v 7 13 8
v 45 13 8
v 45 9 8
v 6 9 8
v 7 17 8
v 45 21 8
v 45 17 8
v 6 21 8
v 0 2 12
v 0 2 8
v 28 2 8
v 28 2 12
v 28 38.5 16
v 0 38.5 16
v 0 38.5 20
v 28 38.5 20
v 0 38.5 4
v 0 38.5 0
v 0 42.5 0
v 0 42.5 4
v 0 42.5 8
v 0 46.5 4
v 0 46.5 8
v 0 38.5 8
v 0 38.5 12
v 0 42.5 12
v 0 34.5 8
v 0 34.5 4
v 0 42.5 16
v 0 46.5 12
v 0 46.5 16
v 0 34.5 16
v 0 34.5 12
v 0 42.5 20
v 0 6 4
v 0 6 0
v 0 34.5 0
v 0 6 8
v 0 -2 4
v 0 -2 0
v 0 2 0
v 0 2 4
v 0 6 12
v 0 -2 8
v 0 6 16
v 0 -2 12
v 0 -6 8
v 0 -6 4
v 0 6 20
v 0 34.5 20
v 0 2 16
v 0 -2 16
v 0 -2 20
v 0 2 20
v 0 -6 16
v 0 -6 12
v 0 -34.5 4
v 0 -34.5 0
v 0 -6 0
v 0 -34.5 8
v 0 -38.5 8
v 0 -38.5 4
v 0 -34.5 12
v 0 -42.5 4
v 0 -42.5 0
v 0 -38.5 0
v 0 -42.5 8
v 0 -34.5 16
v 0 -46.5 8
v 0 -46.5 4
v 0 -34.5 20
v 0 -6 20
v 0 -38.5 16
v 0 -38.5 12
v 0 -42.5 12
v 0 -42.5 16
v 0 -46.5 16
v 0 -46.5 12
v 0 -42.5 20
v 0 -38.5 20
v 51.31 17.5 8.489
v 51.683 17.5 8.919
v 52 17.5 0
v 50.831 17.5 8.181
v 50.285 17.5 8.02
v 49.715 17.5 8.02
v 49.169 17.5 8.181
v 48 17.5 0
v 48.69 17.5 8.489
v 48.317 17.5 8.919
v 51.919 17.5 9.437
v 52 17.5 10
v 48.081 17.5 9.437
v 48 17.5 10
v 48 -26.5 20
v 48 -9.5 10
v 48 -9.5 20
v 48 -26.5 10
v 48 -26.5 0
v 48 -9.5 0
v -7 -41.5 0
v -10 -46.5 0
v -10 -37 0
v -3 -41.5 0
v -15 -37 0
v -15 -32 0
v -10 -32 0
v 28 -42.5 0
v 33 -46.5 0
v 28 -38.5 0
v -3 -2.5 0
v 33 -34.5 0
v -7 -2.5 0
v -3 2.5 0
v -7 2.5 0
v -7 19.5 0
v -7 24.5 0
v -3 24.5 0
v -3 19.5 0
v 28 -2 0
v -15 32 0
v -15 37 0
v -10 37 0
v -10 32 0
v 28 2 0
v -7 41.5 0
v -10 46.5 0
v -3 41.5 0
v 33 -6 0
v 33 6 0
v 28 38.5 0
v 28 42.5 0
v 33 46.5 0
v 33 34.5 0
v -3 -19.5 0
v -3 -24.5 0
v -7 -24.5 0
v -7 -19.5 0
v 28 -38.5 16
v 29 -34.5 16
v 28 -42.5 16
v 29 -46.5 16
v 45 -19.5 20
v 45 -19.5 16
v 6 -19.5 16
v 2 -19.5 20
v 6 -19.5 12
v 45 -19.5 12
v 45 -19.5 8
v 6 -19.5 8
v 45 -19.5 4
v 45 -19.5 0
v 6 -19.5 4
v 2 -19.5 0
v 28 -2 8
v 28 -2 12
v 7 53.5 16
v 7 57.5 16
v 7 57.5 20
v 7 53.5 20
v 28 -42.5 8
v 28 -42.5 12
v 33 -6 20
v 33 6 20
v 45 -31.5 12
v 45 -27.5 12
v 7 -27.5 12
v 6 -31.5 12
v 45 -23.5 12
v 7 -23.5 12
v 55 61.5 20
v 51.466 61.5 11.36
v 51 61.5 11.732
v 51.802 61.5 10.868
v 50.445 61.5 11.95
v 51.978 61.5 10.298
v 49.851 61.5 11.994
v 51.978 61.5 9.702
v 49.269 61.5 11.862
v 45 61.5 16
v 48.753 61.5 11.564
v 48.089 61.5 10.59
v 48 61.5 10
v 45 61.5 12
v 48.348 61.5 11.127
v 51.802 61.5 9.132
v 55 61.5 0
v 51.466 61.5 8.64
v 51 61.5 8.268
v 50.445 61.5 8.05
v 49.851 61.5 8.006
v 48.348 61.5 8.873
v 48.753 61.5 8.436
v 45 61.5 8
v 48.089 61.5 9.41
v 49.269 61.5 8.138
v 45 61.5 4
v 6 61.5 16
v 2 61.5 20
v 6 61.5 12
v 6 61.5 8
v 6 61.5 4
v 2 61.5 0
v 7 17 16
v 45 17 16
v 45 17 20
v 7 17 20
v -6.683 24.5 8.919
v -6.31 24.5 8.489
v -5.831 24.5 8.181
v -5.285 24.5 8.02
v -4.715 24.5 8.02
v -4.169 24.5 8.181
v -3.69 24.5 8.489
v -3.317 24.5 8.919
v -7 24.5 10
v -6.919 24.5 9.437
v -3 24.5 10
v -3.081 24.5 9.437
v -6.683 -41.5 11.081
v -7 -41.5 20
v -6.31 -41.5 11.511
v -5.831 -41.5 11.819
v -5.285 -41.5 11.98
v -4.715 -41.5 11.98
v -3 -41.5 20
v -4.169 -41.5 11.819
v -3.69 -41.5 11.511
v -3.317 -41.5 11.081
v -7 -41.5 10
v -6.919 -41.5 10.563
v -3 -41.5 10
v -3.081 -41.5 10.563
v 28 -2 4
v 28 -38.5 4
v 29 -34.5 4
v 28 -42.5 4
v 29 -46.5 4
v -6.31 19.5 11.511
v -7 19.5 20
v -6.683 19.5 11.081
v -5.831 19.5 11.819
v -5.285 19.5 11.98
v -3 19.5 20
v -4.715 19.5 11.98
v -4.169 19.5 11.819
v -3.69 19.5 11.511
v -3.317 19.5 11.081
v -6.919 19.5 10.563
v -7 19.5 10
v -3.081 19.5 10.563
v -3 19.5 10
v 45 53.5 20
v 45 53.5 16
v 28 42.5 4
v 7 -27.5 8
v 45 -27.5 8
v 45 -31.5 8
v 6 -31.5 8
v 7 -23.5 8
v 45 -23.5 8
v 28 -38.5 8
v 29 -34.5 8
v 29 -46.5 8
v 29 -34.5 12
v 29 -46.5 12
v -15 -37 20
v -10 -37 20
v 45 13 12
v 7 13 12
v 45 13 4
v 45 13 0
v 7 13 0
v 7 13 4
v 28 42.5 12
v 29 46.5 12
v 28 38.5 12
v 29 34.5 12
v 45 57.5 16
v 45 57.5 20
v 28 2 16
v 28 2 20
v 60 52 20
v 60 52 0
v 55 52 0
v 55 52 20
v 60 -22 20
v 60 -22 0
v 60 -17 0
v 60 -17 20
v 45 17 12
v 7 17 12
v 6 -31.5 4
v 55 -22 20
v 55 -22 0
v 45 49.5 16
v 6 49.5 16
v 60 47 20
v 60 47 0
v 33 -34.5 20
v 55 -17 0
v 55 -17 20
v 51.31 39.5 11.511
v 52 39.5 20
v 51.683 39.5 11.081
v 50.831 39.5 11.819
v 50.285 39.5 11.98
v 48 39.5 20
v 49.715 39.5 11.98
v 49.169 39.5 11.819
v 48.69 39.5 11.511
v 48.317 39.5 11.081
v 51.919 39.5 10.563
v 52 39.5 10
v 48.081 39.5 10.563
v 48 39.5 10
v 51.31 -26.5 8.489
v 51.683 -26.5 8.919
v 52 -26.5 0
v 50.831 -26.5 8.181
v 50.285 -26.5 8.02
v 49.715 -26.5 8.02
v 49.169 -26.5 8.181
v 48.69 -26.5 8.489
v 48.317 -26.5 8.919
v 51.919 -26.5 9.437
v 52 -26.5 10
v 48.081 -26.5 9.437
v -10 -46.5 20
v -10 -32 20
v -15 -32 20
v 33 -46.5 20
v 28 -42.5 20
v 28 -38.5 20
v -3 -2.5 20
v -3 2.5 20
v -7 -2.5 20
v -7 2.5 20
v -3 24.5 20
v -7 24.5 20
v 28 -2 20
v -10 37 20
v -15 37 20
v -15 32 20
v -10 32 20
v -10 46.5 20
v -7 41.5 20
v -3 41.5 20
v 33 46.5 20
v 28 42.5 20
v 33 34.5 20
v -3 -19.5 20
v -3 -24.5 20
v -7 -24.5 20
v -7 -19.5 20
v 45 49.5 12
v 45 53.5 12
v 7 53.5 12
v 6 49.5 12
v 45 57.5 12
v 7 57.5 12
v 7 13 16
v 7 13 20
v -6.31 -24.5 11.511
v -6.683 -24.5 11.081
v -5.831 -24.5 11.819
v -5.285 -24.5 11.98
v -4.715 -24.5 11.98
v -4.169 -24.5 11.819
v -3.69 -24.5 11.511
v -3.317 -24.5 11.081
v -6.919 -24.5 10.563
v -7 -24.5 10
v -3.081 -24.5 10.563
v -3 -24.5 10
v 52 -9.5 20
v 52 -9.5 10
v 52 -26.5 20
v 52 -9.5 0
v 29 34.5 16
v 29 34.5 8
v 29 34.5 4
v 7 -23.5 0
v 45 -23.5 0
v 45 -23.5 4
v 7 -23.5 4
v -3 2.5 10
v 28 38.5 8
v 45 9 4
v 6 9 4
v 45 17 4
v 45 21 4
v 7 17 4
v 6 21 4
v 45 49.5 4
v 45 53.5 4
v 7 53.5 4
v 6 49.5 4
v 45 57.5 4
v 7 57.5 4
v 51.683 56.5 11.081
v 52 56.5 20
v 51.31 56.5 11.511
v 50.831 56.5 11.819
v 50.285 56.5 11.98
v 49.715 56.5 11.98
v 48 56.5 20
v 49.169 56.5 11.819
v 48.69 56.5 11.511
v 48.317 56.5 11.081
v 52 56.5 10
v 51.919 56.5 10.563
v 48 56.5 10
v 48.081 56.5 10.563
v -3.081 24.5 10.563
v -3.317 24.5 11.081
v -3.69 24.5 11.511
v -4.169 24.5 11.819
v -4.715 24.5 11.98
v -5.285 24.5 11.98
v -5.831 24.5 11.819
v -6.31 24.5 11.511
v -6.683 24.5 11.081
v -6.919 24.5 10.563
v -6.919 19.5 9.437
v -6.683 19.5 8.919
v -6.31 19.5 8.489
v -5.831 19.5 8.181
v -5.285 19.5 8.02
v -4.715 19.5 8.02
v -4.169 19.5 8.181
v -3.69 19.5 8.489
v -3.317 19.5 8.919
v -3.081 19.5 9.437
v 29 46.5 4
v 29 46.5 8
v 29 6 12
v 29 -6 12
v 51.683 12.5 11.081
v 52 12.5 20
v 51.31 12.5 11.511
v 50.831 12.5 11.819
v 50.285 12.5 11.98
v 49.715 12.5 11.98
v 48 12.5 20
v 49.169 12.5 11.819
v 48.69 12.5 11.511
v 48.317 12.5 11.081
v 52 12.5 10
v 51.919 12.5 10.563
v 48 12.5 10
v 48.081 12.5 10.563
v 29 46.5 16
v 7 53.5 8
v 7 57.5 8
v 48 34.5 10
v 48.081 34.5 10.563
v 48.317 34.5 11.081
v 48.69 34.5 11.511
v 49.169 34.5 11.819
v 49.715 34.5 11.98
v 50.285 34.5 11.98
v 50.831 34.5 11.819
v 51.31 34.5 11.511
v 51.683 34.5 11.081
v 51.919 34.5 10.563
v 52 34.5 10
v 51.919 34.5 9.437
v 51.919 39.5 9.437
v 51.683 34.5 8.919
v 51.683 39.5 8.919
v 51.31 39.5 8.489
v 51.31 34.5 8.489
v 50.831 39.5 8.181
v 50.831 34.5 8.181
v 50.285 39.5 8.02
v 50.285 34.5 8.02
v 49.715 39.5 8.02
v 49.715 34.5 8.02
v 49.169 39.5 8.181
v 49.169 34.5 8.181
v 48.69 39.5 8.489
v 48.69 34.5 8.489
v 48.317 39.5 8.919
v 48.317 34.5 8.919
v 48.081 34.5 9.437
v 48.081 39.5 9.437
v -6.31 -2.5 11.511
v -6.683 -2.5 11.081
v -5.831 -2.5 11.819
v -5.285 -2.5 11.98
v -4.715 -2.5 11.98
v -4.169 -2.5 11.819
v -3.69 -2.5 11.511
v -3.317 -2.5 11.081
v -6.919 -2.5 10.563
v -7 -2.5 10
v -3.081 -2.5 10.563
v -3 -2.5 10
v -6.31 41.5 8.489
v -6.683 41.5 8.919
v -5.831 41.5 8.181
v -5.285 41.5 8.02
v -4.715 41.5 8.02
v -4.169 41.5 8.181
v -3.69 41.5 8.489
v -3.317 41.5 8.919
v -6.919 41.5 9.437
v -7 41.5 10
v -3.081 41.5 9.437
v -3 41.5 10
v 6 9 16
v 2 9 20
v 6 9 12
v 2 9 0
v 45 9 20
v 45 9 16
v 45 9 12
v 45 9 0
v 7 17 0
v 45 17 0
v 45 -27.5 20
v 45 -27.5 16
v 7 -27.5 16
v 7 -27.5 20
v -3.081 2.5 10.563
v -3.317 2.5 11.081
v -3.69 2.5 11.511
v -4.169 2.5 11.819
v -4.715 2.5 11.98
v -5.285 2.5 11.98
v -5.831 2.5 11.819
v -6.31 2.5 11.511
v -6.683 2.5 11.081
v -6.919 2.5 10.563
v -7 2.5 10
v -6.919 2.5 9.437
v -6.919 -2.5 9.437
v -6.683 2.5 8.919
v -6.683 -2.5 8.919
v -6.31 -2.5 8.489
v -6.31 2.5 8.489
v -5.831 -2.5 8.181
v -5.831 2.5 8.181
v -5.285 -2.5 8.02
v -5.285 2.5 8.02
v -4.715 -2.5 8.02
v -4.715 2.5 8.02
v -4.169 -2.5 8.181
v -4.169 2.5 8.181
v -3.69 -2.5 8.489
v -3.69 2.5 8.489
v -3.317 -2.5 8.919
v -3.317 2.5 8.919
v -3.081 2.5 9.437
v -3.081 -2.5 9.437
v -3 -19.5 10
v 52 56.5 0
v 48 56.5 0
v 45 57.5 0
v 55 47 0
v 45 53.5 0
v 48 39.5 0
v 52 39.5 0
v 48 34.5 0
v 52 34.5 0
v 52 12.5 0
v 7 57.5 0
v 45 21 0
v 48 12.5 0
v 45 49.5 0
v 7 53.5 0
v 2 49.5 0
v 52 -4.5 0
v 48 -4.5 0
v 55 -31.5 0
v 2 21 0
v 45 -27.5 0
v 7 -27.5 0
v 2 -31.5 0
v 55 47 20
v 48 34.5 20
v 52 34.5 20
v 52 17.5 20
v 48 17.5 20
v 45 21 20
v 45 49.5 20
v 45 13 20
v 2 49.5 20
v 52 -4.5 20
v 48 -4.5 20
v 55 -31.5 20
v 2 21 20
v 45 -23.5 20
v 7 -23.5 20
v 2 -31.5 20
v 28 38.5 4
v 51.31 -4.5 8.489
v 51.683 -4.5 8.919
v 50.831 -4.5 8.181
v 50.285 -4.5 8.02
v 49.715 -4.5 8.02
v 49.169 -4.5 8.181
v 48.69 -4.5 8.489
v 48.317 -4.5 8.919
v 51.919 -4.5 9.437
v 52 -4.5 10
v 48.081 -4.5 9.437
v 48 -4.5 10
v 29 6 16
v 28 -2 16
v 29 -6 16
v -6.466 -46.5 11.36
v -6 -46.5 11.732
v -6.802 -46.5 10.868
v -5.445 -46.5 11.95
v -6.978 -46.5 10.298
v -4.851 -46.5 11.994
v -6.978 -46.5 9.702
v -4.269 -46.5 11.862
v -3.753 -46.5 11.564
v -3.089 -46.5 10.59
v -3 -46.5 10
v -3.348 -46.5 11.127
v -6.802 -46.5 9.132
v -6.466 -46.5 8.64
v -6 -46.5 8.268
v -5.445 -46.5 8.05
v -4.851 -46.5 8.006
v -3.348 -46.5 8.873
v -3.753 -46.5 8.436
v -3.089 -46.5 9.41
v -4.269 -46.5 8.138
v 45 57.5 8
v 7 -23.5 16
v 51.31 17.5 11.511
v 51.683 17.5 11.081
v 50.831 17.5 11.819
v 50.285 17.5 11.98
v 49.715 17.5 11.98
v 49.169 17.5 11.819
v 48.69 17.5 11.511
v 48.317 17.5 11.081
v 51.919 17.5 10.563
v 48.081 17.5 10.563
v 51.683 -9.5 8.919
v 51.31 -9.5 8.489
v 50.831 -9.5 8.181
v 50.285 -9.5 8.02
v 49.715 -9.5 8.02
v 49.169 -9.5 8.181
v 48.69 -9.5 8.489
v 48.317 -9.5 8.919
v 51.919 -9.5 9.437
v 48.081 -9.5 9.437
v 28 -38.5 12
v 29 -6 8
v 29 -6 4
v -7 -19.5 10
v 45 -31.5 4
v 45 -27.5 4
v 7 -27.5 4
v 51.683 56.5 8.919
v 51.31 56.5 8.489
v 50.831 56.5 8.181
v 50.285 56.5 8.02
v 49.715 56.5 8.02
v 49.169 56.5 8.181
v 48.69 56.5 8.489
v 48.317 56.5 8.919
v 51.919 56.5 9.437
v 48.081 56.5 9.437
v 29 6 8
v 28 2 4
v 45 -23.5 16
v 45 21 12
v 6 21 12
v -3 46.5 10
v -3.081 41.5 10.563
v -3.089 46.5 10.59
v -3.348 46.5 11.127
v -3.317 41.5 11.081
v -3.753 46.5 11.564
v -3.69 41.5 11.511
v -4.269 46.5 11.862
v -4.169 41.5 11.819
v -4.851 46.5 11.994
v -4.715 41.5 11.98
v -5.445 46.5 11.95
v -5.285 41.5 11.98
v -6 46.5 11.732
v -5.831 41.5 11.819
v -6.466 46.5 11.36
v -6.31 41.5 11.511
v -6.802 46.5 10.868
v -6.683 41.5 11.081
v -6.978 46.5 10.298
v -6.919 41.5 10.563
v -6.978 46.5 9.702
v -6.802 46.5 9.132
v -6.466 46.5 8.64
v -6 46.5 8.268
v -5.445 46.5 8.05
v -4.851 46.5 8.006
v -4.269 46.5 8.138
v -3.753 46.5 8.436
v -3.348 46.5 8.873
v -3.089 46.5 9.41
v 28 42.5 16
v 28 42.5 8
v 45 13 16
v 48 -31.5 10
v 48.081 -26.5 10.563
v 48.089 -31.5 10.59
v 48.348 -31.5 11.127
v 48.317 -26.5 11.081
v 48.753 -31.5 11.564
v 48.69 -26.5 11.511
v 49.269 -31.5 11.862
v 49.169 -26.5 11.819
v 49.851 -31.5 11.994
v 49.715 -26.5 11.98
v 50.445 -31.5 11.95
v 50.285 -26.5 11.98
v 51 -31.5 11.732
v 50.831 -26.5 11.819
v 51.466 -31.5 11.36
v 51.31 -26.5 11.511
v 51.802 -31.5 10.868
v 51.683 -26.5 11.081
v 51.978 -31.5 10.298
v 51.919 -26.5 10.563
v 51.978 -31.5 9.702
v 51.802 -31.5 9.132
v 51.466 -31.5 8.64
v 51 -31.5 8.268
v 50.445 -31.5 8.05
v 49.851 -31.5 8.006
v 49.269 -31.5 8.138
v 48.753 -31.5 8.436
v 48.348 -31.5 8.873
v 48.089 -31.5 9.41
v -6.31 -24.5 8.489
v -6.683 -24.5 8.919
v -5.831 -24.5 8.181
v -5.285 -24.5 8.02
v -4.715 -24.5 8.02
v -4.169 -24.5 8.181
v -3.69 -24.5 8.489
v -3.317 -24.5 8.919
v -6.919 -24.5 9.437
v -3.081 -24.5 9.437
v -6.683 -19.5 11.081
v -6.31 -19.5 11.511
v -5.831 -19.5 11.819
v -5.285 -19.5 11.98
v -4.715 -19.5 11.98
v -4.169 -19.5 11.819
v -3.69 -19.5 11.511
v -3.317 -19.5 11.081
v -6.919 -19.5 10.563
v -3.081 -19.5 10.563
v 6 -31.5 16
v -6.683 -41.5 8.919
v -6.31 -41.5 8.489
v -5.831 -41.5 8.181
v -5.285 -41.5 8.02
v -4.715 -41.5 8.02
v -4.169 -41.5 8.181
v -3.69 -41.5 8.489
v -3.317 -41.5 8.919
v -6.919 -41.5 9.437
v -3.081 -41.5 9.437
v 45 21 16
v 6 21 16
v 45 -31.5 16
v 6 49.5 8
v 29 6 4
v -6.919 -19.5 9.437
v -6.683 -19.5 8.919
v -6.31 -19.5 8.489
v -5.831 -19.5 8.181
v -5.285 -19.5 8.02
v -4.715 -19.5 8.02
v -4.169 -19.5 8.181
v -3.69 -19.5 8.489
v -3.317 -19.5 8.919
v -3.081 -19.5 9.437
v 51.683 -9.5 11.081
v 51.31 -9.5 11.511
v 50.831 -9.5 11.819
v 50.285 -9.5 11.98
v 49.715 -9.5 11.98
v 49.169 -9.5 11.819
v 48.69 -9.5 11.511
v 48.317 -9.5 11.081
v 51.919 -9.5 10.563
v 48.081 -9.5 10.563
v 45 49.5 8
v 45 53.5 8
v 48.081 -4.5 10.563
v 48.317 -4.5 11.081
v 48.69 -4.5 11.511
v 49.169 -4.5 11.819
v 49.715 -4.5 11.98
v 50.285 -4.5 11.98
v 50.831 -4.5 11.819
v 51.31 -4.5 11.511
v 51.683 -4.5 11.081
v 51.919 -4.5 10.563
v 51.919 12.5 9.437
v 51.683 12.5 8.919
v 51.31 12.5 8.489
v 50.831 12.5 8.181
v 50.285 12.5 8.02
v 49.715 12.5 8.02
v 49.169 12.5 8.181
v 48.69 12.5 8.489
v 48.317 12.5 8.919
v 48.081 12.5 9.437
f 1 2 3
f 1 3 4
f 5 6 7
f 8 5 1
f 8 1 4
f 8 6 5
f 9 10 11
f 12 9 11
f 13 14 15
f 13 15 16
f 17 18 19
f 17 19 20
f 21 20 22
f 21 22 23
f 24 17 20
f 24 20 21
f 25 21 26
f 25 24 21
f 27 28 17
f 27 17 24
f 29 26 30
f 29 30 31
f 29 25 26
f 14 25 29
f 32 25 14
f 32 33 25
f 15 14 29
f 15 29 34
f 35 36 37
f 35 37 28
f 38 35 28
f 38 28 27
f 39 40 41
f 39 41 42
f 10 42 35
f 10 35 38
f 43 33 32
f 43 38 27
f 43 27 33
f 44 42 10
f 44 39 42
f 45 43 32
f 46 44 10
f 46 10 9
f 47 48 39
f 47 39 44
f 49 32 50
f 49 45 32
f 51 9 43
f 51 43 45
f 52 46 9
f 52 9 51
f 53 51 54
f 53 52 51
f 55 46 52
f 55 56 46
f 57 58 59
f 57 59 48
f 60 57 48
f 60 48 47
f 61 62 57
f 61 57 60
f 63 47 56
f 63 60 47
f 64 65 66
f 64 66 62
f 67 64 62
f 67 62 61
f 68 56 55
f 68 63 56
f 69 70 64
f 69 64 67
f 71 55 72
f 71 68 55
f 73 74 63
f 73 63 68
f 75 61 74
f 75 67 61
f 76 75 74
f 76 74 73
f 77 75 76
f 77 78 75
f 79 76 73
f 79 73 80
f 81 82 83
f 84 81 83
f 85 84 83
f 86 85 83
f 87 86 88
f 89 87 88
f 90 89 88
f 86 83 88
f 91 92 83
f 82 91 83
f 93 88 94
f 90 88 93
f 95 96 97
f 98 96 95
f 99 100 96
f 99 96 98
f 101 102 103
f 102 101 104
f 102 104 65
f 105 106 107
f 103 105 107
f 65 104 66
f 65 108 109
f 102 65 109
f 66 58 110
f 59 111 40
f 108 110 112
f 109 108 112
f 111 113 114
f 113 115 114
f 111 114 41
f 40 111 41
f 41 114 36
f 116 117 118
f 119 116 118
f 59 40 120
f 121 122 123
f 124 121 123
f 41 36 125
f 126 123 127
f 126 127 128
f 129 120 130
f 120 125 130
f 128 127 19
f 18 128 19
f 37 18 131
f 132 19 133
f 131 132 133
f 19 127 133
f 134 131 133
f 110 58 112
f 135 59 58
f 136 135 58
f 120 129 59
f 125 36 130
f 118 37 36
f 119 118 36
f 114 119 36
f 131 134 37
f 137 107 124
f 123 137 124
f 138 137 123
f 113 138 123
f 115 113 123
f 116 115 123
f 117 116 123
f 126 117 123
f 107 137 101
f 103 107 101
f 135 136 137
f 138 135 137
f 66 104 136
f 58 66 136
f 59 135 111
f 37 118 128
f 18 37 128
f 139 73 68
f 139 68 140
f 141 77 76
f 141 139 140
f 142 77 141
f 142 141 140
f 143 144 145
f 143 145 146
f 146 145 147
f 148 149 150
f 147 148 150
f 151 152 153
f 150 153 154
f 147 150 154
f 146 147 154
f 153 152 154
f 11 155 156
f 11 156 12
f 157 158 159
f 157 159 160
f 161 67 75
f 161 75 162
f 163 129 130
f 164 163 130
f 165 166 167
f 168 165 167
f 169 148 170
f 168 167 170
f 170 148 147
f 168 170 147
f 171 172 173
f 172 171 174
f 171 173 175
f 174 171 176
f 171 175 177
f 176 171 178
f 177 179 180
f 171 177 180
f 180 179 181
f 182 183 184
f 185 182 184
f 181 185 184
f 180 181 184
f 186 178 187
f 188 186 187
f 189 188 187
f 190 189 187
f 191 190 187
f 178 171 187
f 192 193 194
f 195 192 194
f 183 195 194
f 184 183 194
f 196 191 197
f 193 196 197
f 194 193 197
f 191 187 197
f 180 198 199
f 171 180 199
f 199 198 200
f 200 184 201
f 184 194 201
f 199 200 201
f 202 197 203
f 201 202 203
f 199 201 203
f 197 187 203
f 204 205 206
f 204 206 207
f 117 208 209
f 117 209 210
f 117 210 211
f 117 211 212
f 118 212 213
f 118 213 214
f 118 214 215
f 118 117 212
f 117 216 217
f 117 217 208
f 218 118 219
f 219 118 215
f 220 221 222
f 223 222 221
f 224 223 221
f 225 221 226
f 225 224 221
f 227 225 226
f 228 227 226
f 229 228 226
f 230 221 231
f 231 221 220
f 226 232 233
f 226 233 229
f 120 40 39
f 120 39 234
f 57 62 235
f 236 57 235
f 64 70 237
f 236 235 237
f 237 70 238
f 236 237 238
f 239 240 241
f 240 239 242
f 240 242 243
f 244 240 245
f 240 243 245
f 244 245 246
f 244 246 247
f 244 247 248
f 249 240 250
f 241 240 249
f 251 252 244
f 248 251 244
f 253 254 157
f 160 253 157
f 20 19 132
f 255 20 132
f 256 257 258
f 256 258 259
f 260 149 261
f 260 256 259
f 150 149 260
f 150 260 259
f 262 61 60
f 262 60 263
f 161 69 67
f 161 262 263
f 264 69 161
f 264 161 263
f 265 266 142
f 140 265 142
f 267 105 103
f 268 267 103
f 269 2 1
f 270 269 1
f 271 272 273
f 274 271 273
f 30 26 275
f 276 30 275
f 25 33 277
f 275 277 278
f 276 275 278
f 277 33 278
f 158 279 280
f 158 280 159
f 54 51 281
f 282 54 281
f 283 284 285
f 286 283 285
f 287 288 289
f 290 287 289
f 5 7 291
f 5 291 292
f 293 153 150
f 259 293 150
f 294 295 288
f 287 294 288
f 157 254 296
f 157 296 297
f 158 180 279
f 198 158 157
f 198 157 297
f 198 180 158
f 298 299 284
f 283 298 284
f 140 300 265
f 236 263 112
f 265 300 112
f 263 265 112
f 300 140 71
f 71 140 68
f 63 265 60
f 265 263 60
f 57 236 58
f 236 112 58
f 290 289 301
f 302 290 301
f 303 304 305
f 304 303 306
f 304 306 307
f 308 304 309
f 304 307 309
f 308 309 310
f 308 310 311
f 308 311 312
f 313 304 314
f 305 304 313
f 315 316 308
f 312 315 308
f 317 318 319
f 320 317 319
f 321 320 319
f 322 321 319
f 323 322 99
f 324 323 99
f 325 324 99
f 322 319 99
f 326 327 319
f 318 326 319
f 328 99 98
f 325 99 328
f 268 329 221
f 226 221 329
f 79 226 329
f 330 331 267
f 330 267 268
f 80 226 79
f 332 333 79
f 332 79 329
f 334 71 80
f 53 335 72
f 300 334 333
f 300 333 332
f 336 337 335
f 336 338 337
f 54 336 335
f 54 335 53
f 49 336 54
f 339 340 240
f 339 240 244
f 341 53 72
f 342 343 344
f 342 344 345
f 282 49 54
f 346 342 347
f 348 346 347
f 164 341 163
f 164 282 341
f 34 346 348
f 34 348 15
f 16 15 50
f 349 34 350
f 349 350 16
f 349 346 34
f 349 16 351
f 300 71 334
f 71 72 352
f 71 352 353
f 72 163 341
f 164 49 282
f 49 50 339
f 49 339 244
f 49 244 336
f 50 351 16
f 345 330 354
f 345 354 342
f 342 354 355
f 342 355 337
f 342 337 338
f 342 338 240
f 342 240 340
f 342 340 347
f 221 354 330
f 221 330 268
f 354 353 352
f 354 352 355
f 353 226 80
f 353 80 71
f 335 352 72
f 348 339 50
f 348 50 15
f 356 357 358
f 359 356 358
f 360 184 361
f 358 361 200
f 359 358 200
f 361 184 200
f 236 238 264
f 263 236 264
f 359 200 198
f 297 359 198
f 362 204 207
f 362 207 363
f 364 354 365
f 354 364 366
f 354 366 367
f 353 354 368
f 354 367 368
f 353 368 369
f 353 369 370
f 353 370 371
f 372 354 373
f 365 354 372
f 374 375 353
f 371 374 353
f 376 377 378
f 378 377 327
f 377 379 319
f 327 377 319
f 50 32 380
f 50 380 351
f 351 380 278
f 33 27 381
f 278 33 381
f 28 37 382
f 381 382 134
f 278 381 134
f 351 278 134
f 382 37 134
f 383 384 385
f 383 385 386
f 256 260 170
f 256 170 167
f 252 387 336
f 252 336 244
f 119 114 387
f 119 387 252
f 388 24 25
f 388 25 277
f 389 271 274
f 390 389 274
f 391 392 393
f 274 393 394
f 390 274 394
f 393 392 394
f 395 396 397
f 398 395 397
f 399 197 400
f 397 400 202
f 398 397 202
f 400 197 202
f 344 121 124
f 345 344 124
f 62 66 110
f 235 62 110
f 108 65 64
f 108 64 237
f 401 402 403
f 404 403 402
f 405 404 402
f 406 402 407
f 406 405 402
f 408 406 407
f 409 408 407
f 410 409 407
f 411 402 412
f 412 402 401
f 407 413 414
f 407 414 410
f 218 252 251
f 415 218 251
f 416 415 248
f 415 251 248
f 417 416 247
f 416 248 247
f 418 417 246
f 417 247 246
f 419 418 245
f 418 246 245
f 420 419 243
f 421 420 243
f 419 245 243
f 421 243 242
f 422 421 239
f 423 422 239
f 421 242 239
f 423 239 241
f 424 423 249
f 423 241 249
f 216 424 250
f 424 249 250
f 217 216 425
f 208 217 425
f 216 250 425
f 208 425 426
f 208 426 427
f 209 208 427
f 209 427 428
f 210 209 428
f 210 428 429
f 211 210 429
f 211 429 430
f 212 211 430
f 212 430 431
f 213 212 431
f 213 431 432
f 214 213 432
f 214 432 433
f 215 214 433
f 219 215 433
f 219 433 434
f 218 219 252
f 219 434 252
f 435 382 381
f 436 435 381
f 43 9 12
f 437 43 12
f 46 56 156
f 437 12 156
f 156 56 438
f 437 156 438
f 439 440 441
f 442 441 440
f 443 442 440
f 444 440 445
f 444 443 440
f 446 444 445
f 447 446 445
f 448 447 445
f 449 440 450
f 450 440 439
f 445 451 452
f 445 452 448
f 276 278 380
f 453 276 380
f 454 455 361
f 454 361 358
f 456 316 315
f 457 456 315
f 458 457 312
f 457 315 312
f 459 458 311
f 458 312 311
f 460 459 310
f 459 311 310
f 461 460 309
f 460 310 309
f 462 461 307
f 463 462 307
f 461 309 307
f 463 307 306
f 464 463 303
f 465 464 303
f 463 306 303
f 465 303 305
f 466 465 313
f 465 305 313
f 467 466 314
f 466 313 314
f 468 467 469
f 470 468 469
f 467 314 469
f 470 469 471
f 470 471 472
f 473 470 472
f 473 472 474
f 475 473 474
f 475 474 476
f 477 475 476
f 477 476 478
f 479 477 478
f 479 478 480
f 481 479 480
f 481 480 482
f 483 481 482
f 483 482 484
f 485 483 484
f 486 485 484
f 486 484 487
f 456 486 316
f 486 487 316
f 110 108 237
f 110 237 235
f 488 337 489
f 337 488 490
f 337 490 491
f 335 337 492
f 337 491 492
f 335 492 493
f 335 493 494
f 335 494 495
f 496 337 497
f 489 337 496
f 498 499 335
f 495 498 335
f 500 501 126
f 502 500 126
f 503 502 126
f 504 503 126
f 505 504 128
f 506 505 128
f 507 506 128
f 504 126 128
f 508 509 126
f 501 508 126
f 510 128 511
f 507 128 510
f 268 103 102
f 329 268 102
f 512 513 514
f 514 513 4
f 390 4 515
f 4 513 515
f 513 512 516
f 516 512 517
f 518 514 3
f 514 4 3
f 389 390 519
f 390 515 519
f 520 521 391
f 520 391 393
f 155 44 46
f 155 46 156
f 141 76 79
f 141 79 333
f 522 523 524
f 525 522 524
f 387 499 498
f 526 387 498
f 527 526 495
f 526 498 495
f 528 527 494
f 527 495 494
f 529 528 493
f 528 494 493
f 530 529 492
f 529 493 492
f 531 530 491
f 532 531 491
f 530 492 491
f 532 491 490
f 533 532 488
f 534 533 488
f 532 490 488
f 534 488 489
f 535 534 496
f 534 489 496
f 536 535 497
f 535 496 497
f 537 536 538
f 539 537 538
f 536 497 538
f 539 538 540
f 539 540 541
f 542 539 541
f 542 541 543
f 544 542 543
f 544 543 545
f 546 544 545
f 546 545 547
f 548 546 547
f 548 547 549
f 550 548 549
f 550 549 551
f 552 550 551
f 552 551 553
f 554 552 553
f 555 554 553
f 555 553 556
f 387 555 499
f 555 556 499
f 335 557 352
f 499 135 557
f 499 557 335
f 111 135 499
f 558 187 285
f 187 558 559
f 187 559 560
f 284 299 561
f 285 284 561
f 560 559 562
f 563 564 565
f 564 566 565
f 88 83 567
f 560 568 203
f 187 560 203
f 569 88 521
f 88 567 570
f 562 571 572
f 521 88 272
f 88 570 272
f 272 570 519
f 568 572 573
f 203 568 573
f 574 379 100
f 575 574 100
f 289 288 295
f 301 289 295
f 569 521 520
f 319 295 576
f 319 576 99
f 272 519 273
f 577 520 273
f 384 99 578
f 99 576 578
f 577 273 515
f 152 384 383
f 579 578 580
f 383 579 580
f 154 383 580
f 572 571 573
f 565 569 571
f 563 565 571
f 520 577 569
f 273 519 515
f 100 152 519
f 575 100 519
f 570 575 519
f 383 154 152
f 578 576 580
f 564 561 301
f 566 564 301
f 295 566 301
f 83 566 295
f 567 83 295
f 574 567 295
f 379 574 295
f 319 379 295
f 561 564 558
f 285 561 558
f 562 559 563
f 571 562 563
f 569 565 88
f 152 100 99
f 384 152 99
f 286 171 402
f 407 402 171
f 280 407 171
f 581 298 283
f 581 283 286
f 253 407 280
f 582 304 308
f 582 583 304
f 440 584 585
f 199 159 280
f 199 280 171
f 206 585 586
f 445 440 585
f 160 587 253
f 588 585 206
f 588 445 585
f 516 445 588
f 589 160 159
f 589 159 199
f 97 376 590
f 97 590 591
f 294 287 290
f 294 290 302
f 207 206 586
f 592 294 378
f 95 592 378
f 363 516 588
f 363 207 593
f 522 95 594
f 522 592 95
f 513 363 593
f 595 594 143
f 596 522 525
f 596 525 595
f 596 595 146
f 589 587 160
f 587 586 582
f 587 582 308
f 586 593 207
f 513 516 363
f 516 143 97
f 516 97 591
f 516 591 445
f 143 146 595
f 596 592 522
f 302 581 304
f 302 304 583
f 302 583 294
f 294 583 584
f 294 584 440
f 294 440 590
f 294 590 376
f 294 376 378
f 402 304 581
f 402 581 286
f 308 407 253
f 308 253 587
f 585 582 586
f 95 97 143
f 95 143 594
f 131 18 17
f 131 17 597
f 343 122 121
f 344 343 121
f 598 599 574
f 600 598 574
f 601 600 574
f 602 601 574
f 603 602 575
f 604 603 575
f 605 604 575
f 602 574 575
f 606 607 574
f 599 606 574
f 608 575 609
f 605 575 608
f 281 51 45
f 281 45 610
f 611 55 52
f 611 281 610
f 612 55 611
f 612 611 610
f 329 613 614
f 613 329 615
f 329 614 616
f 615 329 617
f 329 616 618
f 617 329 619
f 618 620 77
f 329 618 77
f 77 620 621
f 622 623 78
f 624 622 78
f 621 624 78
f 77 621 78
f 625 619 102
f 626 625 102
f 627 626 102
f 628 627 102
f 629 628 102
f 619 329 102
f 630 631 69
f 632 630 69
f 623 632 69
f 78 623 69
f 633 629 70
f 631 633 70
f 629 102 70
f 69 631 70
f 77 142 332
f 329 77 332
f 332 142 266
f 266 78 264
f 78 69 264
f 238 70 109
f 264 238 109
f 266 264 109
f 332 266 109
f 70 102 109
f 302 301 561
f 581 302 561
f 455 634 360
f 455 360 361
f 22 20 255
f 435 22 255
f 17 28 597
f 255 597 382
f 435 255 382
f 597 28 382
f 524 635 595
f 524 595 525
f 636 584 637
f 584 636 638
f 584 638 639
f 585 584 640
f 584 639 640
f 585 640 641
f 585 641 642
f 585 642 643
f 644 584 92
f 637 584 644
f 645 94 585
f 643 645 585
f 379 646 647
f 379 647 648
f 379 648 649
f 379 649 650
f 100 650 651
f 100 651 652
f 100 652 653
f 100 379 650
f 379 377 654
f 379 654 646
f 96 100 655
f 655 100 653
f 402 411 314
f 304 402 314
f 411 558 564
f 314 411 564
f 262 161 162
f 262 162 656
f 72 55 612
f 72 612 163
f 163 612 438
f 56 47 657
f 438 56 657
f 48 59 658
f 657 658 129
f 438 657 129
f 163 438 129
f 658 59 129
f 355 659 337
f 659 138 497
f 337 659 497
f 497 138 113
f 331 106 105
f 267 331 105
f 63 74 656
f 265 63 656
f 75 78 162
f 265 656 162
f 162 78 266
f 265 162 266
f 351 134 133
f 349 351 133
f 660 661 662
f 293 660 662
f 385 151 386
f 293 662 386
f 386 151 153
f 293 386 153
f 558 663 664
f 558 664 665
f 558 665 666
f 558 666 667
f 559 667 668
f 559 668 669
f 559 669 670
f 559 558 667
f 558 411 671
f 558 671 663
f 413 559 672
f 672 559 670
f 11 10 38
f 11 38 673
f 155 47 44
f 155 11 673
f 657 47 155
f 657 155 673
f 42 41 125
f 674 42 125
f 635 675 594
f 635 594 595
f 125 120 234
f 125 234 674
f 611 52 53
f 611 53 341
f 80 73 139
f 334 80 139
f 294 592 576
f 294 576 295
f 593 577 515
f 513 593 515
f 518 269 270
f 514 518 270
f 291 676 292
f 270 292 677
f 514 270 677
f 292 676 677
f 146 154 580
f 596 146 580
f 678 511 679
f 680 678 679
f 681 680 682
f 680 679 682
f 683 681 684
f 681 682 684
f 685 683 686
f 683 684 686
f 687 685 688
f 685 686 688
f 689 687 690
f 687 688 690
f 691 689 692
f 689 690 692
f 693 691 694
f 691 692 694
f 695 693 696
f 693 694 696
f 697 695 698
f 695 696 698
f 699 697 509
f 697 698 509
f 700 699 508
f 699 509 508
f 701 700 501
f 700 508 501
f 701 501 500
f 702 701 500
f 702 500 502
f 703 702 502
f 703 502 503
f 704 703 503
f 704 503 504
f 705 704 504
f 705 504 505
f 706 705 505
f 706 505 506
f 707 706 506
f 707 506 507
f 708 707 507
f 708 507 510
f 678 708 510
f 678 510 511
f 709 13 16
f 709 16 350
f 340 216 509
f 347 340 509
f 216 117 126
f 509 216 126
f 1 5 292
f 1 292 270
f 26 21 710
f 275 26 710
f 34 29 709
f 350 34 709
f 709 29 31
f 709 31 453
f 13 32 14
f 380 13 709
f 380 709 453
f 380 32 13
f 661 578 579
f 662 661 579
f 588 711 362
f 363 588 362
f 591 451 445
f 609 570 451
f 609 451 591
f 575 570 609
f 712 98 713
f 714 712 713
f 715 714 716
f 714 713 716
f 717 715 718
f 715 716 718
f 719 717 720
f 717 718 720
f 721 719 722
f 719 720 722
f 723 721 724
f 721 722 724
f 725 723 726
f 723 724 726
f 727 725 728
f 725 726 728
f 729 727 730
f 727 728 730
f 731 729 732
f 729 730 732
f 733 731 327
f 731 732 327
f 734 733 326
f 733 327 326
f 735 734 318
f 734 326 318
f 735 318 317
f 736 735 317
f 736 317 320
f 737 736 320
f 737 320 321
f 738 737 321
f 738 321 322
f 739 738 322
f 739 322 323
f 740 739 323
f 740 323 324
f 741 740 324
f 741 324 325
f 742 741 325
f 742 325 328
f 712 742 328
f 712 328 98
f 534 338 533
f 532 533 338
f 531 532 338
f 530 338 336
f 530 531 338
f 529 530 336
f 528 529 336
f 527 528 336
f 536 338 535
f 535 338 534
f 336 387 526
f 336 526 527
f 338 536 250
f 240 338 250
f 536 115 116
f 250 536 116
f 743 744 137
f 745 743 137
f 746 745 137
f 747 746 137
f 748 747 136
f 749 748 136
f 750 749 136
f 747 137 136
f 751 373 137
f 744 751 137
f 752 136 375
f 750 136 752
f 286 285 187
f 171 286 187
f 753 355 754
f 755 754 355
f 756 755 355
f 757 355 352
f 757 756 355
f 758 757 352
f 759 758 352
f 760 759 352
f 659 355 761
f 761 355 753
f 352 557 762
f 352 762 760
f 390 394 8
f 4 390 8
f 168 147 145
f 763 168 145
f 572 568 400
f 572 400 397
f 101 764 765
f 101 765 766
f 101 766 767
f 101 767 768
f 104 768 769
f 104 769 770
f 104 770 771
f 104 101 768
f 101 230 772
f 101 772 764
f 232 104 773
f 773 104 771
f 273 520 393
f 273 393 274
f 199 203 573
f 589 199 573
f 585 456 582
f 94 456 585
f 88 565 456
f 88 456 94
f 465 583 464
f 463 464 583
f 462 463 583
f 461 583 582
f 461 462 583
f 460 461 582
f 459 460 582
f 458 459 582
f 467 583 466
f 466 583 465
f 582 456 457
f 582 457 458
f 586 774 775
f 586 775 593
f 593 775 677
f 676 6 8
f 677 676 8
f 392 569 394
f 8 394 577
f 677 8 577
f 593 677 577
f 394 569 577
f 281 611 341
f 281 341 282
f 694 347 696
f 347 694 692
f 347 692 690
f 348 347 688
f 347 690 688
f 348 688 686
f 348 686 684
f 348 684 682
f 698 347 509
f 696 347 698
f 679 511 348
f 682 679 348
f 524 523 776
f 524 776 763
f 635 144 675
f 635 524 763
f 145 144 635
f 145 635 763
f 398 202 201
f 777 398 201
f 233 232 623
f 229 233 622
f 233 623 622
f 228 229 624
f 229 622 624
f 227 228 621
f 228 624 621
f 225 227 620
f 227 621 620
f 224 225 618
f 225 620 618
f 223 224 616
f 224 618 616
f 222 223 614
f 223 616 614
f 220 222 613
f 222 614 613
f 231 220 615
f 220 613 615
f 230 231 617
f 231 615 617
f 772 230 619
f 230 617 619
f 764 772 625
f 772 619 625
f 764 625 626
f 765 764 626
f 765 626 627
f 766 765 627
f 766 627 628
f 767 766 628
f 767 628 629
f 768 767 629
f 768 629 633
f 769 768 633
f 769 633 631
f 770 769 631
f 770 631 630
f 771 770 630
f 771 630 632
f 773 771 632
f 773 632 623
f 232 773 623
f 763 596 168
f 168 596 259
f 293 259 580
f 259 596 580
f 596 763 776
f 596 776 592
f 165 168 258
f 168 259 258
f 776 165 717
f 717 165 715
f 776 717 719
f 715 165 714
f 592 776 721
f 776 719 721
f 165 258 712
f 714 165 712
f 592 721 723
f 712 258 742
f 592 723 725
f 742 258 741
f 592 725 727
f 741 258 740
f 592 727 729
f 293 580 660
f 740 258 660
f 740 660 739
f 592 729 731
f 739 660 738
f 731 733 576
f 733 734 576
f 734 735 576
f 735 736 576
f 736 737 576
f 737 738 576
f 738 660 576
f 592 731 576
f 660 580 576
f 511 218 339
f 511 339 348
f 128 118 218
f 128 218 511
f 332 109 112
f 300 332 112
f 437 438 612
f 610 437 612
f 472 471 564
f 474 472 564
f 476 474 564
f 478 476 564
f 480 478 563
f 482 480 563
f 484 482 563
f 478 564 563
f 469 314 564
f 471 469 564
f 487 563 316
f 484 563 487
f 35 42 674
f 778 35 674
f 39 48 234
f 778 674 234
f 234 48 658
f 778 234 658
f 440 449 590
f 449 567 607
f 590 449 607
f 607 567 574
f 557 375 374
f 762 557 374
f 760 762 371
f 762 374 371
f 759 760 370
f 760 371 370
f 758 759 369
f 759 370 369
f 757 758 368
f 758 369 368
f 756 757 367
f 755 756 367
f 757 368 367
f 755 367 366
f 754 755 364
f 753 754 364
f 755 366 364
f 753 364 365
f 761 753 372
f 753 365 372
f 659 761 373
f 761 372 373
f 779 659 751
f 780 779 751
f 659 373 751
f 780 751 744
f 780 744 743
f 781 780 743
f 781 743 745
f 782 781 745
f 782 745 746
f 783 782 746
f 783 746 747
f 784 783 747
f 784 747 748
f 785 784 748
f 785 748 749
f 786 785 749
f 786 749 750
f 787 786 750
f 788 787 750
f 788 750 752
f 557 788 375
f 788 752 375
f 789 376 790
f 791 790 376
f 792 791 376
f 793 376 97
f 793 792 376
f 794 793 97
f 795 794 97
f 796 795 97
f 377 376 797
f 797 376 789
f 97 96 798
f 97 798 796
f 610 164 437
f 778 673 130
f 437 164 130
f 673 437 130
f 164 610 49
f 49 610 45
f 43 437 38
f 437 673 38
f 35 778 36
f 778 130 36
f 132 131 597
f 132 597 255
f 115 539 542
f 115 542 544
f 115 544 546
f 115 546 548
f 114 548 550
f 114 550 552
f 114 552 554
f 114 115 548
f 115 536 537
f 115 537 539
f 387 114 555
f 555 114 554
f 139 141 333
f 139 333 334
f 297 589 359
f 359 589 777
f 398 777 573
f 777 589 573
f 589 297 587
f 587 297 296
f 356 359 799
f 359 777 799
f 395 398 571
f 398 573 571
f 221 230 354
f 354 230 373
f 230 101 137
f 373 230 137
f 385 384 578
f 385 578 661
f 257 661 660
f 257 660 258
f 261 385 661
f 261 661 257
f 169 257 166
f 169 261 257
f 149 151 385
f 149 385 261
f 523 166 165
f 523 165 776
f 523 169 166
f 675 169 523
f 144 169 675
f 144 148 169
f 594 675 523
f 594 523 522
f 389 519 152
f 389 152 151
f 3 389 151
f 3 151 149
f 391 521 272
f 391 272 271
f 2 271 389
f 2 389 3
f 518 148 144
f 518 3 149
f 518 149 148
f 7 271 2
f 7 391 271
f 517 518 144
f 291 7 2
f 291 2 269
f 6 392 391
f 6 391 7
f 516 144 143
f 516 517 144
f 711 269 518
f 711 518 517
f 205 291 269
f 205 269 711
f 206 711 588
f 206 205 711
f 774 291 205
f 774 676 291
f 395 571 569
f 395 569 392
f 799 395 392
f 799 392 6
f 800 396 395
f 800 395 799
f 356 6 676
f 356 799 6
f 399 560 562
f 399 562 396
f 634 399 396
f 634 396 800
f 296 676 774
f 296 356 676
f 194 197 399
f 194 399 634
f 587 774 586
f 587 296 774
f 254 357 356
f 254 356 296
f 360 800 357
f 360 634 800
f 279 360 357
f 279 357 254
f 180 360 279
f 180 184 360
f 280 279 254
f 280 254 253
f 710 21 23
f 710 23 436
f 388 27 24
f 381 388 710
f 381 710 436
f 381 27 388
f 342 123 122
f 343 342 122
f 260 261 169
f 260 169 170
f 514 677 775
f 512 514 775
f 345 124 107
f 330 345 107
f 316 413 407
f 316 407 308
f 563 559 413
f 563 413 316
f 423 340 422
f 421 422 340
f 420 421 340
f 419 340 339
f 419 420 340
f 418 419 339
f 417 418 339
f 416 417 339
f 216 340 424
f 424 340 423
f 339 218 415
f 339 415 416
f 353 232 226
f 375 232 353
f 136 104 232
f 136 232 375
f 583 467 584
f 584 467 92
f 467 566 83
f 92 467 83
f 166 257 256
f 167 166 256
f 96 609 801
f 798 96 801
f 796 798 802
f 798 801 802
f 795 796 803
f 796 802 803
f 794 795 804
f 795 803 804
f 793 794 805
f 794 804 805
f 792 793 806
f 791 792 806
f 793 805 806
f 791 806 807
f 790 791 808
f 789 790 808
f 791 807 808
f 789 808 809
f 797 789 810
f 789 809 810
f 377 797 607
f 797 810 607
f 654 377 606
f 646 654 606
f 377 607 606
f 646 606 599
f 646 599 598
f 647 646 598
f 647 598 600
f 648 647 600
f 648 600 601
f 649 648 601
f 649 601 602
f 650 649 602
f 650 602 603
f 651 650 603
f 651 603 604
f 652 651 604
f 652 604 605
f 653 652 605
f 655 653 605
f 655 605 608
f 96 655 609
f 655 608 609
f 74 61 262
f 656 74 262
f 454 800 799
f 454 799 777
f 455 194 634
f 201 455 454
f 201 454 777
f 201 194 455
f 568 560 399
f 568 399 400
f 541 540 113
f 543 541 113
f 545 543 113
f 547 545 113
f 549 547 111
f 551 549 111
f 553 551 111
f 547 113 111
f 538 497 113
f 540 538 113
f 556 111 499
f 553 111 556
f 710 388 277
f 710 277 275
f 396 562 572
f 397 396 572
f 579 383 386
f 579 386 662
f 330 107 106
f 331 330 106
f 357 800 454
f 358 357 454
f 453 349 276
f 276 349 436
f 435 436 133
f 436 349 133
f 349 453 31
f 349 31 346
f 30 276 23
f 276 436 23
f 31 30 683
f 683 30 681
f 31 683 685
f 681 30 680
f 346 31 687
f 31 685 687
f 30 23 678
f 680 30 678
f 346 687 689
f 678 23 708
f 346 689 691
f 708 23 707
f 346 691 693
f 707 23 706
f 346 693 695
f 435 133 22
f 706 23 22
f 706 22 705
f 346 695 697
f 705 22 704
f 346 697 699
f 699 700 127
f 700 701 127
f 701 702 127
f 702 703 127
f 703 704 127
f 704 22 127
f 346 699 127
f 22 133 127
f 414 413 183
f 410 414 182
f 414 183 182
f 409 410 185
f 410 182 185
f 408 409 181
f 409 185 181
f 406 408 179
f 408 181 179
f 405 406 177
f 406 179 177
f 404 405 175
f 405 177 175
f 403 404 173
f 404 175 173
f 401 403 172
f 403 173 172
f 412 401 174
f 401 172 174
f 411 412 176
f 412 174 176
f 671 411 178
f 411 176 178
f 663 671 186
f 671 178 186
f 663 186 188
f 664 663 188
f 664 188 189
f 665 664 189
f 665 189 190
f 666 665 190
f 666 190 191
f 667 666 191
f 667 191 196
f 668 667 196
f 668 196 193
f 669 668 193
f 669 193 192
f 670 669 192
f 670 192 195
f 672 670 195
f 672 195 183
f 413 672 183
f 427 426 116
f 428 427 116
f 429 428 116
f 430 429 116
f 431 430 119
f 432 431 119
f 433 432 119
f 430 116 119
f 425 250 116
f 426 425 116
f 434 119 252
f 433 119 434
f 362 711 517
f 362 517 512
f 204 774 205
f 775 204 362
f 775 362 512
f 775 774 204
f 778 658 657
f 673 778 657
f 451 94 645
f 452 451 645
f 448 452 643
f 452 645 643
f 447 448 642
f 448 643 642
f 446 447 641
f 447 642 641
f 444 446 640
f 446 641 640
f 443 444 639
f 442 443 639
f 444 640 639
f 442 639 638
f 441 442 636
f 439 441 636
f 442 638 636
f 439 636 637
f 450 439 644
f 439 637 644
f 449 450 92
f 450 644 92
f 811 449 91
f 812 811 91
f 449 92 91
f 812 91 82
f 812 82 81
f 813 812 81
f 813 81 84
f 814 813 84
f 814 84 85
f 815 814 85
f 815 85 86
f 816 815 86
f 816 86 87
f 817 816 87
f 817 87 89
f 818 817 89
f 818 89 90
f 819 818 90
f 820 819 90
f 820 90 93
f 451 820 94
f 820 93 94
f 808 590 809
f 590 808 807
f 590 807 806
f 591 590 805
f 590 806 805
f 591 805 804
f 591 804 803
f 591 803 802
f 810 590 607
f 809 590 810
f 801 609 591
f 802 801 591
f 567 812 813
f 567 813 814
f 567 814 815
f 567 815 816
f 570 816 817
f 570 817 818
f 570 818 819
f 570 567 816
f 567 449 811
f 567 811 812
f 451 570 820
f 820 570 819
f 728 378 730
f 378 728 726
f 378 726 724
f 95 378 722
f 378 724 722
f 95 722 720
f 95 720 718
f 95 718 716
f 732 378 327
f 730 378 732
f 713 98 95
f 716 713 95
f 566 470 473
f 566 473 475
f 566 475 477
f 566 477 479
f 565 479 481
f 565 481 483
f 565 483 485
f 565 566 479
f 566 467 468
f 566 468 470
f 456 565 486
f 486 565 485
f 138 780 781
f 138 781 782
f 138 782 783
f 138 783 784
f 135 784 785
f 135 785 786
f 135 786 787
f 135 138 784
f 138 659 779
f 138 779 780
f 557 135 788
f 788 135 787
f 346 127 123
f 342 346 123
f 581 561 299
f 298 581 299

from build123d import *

# Parameters (mm, degrees)
SKETCH_W        = 4
SKETCH_H        = 17
SKETCH_W_2      = 28
SKETCH_H_2      = 4
PAD_DEPTH       = 20
SKETCH001_R     = 2
SKETCH001_W     = 29
SKETCH001_H     = 4
POCKET_DEPTH    = 93.001
SKETCH002_W     = 4
SKETCH002_H     = 17
SKETCH002_W_2   = 38
SKETCH002_H_2   = 4
PAD001_DEPTH    = 20
SKETCH003_R     = 2
SKETCH003_W     = 39
SKETCH003_H     = 4
POCKET001_DEPTH = 93.001


with BuildPart() as soporte_aligerado:
    # Sketch → Pad (new body)
    with BuildSketch(Plane.XY):
        Polygon((-10, -46.5), (33, -46.5), (33, -34.5), (0, -34.5), (0, -6), (33, -6), (33, 6), (0, 6), (0, 34.5), (33, 34.5), (33, 46.5), (-10, 46.5), (-10, 37), (-15, 37), (-15, 32), (-10, 32), (-10, -32), (-15, -32), (-15, -37), (-10, -37), align=None)
        with Locations((-5, 33)):
            Rectangle(SKETCH_W, SKETCH_H, mode=Mode.SUBTRACT)
        with Locations((-5, -33)):
            Rectangle(SKETCH_W, SKETCH_H, mode=Mode.SUBTRACT)
        with Locations((-5, -11)):
            Rectangle(SKETCH_W, SKETCH_H, mode=Mode.SUBTRACT)
        with Locations((-5, 11)):
            Rectangle(SKETCH_W, SKETCH_H, mode=Mode.SUBTRACT)
        with Locations((14, -40.5)):
            Rectangle(SKETCH_W_2, SKETCH_H_2, mode=Mode.SUBTRACT)
        with Locations((14, 0)):
            Rectangle(SKETCH_W_2, SKETCH_H_2, mode=Mode.SUBTRACT)
        with Locations((14, 40.5)):
            Rectangle(SKETCH_W_2, SKETCH_H_2, mode=Mode.SUBTRACT)
    extrude(amount=PAD_DEPTH)

    # Sketch001 → Pocket (cut, through all)
    with BuildSketch(Plane.XZ.offset(46.5)):
        with Locations((-5, 10)):
            Circle(SKETCH001_R)
        with Locations((14.5, 14)):
            Rectangle(SKETCH001_W, SKETCH001_H)
        with Locations((14.5, 6)):
            Rectangle(SKETCH001_W, SKETCH001_H)
    extrude(amount=-POCKET_DEPTH, mode=Mode.SUBTRACT)


with BuildPart() as soporte_aligerado001:
    # Sketch002 → Pad001 (new body)
    with BuildSketch(Plane(origin=(45, 15, 0), x_dir=(-1, 0, 0), z_dir=(0, 0, 1))):
        Polygon((-10, -46.5), (43, -46.5), (43, -34.5), (0, -34.5), (0, -6), (43, -6), (43, 6), (0, 6), (0, 34.5), (43, 34.5), (43, 46.5), (-10, 46.5), (-10, 37), (-15, 37), (-15, 32), (-10, 32), (-10, -32), (-15, -32), (-15, -37), (-10, -37), align=None)
        with Locations((-5, 33)):
            Rectangle(SKETCH002_W, SKETCH002_H, mode=Mode.SUBTRACT)
        with Locations((-5, -33)):
            Rectangle(SKETCH002_W, SKETCH002_H, mode=Mode.SUBTRACT)
        with Locations((-5, -11)):
            Rectangle(SKETCH002_W, SKETCH002_H, mode=Mode.SUBTRACT)
        with Locations((-5, 11)):
            Rectangle(SKETCH002_W, SKETCH002_H, mode=Mode.SUBTRACT)
        with Locations((19, -40.5)):
            Rectangle(SKETCH002_W_2, SKETCH002_H_2, mode=Mode.SUBTRACT)
        with Locations((19, 0)):
            Rectangle(SKETCH002_W_2, SKETCH002_H_2, mode=Mode.SUBTRACT)
        with Locations((19, 40.5)):
            Rectangle(SKETCH002_W_2, SKETCH002_H_2, mode=Mode.SUBTRACT)
    extrude(amount=PAD001_DEPTH)

    # Sketch003 → Pocket001 (cut, through all)
    with BuildSketch(Plane(origin=(45, 61.5, 0), x_dir=(-1, 0, 0), z_dir=(0, 1, 0))):
        with Locations((-5, 10)):
            Circle(SKETCH003_R)
        with Locations((19.5, 14)):
            Rectangle(SKETCH003_W, SKETCH003_H)
        with Locations((19.5, 6)):
            Rectangle(SKETCH003_W, SKETCH003_H)
    extrude(amount=-POCKET001_DEPTH, mode=Mode.SUBTRACT)


solid = Compound([soporte_aligerado.part, soporte_aligerado001.part])
